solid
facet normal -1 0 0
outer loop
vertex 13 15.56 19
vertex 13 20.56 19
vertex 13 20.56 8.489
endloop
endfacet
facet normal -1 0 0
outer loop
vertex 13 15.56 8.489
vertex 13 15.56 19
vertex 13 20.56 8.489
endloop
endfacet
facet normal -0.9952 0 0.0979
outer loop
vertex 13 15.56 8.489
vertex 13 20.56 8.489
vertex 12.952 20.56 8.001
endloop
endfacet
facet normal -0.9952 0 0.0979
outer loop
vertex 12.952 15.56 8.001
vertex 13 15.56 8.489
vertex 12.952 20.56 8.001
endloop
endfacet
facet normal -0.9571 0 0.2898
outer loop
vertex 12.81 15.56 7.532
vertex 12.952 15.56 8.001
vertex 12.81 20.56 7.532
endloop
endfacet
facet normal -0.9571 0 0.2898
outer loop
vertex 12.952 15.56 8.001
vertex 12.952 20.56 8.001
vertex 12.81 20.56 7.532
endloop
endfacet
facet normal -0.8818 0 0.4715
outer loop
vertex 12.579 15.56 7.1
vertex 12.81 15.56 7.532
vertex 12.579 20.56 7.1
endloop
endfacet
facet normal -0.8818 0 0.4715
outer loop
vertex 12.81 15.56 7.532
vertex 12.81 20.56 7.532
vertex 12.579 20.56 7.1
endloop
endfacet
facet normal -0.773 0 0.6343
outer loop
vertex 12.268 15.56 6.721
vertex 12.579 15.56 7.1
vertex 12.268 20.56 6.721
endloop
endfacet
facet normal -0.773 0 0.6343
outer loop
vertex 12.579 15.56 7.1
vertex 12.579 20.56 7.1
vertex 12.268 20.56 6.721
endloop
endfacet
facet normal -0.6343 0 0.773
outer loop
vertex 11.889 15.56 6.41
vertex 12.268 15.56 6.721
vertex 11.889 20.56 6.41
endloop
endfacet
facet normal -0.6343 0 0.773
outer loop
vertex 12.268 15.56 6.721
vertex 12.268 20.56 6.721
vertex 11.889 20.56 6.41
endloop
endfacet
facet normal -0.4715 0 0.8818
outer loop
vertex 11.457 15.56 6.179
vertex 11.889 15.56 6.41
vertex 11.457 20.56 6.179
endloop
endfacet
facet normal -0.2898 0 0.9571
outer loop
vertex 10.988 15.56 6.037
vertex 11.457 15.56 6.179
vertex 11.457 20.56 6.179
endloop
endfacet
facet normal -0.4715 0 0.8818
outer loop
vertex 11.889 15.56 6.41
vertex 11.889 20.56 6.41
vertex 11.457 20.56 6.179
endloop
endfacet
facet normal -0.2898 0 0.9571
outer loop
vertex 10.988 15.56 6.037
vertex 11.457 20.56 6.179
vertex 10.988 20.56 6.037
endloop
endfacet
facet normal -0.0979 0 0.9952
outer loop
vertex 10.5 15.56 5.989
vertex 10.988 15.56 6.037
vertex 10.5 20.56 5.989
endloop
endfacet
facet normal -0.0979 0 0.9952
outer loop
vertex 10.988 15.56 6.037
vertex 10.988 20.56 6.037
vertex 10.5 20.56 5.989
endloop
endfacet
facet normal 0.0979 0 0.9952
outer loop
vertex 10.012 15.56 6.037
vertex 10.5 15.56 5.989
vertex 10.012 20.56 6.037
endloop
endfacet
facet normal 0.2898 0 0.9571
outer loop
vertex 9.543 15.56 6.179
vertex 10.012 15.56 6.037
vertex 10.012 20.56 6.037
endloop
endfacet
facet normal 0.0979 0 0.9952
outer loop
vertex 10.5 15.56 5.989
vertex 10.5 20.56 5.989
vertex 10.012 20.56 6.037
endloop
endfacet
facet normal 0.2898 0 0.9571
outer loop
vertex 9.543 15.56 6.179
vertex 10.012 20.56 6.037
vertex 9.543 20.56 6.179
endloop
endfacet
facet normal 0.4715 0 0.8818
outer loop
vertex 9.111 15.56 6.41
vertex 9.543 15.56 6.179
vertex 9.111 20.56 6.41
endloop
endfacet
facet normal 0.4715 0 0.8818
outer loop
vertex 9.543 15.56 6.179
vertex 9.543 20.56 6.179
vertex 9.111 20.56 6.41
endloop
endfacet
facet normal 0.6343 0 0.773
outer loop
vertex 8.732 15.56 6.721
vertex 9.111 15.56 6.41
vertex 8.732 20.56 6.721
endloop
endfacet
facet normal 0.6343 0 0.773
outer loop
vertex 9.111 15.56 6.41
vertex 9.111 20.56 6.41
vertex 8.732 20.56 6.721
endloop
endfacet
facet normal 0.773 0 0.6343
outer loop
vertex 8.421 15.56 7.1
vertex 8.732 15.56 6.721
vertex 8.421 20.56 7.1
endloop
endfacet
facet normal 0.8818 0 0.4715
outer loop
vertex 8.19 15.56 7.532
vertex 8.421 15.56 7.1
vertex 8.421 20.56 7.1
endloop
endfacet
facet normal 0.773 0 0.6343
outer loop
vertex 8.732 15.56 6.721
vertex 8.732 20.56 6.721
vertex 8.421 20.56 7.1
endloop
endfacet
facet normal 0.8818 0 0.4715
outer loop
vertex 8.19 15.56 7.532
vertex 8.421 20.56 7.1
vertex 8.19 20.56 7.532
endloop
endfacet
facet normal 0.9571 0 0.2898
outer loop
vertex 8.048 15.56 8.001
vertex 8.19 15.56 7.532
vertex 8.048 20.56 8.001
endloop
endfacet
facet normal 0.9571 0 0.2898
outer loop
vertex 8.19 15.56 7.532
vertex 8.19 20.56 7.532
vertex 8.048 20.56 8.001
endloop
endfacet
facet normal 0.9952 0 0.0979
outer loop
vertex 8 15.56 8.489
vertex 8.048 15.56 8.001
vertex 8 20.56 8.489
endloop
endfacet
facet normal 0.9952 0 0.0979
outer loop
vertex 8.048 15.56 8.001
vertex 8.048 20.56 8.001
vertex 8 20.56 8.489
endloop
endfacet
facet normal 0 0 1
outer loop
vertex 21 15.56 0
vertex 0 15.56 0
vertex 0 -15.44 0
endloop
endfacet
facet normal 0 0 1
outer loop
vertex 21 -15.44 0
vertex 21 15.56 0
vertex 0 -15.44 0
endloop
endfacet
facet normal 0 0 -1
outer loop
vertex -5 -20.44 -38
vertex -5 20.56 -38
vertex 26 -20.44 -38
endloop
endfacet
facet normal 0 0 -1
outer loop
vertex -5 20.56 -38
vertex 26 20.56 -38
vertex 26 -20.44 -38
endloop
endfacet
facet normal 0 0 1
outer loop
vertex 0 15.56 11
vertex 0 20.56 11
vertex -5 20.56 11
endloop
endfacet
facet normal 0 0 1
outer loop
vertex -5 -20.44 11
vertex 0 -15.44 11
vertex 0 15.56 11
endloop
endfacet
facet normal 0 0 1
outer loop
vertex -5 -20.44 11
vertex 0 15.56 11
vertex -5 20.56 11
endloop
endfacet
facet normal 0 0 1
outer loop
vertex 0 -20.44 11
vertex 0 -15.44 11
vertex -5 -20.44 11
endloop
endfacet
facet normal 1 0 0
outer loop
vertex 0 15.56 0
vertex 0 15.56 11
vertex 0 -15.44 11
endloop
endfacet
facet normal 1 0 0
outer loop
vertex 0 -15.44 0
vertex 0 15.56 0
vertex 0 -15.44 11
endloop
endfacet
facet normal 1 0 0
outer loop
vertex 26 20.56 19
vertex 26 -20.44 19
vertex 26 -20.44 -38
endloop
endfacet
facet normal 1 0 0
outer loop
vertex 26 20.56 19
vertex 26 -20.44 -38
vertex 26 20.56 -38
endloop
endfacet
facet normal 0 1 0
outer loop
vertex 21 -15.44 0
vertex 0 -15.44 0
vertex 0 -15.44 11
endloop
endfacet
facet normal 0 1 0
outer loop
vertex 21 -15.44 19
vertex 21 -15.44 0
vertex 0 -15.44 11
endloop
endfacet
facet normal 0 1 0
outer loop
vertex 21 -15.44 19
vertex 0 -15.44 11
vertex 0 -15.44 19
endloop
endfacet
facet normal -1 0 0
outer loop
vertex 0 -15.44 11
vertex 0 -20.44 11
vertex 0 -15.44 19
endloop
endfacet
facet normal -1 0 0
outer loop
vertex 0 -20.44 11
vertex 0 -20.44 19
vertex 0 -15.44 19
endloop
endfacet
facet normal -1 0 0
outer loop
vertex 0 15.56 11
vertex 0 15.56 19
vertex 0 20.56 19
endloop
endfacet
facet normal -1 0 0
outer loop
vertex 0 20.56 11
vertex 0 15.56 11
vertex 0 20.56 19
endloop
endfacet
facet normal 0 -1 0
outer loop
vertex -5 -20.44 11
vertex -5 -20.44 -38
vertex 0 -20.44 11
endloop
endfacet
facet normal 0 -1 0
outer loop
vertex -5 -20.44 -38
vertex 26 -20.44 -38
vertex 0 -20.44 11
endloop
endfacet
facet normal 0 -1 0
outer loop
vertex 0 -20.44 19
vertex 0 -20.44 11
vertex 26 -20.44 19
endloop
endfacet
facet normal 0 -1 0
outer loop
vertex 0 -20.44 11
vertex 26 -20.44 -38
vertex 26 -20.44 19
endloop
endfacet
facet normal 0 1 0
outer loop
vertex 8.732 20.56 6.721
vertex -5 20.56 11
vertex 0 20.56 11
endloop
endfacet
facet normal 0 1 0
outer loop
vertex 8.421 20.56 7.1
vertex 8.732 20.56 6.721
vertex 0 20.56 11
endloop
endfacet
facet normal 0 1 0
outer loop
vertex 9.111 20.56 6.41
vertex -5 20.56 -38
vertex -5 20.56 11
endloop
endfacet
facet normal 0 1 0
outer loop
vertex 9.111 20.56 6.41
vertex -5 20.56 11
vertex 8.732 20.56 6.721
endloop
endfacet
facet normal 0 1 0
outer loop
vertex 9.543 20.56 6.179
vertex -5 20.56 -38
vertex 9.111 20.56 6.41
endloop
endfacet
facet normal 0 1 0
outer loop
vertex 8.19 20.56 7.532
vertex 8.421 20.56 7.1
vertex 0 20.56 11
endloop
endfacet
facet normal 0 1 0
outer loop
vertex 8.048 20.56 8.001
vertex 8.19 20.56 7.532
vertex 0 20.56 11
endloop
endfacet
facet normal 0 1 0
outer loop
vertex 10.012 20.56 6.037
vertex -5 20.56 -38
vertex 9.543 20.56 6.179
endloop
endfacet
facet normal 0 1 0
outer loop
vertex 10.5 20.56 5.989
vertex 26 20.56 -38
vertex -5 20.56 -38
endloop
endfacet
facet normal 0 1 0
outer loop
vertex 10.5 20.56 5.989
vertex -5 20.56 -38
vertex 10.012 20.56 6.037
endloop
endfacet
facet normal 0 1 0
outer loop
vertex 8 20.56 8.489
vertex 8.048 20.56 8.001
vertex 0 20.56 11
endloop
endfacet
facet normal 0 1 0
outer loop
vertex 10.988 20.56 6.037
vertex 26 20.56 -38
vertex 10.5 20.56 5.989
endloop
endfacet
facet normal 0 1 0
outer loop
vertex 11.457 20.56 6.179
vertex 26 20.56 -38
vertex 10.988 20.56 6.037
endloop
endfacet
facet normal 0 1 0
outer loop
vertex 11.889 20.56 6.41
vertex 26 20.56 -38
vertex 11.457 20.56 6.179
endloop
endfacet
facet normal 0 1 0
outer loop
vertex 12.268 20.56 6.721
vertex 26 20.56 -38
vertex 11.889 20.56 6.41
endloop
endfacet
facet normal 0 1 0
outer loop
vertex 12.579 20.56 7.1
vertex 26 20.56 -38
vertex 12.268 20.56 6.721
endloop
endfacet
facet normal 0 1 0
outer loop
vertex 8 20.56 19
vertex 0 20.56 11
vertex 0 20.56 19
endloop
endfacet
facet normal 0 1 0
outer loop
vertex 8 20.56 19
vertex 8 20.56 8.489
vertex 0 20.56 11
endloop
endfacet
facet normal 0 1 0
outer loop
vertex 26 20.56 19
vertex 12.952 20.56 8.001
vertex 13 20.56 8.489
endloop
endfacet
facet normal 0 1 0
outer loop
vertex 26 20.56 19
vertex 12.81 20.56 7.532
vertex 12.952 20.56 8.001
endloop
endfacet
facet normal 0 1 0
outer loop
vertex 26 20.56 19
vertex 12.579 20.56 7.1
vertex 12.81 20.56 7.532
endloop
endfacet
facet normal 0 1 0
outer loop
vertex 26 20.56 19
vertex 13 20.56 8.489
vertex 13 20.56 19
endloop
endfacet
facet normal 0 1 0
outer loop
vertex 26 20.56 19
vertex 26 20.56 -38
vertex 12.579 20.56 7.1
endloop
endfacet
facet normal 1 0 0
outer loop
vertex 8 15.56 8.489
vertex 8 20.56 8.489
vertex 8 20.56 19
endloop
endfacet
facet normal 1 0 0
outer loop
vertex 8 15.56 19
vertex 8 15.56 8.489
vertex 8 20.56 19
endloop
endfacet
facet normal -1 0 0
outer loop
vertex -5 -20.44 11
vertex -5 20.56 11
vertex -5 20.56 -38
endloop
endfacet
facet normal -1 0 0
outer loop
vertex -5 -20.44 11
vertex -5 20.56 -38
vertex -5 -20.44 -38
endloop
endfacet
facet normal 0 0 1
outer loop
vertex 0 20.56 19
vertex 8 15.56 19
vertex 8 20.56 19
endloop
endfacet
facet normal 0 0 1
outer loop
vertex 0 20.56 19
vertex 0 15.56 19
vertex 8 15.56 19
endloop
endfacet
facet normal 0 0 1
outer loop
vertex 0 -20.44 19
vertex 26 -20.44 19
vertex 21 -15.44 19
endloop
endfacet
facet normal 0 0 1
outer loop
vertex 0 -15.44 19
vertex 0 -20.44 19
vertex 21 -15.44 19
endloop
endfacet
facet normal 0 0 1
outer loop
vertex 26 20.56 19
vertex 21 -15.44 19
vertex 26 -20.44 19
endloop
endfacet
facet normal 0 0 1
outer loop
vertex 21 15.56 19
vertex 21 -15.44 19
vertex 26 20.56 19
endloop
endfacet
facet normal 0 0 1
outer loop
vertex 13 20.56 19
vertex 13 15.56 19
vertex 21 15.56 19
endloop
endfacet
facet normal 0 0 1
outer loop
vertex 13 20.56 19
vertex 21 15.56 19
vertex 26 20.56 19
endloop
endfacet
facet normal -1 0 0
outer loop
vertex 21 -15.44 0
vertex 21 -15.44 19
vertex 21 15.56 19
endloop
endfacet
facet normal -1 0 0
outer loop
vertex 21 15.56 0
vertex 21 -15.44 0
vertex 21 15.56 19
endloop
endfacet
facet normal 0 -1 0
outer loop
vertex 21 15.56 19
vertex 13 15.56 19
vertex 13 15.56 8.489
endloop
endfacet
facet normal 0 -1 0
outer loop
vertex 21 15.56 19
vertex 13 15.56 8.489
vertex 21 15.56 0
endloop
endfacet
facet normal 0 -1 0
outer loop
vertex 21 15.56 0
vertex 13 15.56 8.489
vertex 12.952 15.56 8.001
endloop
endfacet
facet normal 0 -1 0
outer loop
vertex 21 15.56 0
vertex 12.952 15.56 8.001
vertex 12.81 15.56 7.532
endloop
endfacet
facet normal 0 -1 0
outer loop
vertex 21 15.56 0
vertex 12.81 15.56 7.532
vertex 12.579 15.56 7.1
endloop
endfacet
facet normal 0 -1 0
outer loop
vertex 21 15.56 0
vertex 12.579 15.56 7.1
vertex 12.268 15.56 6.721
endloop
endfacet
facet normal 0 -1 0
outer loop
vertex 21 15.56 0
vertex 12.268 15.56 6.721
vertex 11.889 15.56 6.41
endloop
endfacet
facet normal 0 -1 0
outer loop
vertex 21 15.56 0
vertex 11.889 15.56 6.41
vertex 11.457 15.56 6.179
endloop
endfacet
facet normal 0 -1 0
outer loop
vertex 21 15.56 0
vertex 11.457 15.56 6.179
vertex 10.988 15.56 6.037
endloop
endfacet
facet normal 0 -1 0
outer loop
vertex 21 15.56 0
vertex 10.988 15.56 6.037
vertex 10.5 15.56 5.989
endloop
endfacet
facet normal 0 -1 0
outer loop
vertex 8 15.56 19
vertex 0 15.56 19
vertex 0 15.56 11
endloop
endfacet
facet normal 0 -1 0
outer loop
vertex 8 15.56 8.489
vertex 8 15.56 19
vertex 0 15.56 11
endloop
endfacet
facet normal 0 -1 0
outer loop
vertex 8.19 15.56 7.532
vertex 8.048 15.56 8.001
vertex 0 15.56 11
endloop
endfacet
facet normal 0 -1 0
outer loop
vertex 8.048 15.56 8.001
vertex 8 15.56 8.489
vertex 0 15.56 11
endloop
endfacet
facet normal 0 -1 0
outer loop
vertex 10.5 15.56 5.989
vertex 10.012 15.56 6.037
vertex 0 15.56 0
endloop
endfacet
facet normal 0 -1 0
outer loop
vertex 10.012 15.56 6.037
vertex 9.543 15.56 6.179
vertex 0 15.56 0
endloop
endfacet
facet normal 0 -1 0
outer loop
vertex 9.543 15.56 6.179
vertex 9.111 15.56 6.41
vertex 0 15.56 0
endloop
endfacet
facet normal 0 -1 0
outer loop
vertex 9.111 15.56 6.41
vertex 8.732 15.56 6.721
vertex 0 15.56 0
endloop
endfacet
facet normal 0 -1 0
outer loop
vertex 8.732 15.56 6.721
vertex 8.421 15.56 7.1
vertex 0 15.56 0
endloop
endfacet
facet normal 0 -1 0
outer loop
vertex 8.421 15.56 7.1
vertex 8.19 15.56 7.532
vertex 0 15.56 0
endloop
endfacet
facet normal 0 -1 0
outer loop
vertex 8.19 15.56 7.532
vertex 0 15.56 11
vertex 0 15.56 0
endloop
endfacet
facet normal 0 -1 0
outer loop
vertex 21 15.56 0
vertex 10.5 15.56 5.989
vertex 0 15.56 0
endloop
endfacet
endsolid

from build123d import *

# Parameters (mm, degrees)
F1_DEPTH = 21
F2_W     = 41
F2_H     = 57
F3_DEPTH = 5
F4_W     = 41
F4_H     = 49
F5_DEPTH = 5
F7_DEPTH = 5


with BuildPart() as f1:
    # F0 (on Right) → F1 (new body)
    with BuildSketch(Plane.YZ):
        Polygon((15.559513, 19), (15.559513, 0), (-15.440487, 0), (-15.440487, 19), (-20.440487, 19), (-20.440487, 0), (-20.440487, -38), (-15.440487, -38), (15.469343, -38), (20.559513, -38), (20.559513, 0), (20.559513, 19), align=None)
    extrude(amount=F1_DEPTH)

    # F2 (on face) → F3 (join)
    with BuildSketch(Plane.YZ.offset(21)):
        with Locations((0.059513, -9.5)):
            Rectangle(F2_W, F2_H)
    extrude(amount=F3_DEPTH)

    # F4 (on face) → F5 (join)
    with BuildSketch(Plane(origin=(0, 0, 0), x_dir=(0, -1, 0), z_dir=(-1, 0, 0))):
        with Locations((-0.059513, -13.5)):
            Rectangle(F4_W, F4_H)
    extrude(amount=F5_DEPTH)

    # F6 (on face) → F7 (cut)
    with BuildSketch(Plane(origin=(0, 20.559513, 0), x_dir=(-1, 0, 0), z_dir=(0, 1, 0))):
        with BuildLine():
            Line((-8, 8.489112), (-8, 19))
            Line((-8, 19), (-13, 19))
            Line((-13, 19), (-13, 8.489112))
            ThreePointArc((-13, 8.489112), (-10.5, 5.989112), (-8, 8.489112))
        make_face()
    extrude(amount=-F7_DEPTH, mode=Mode.SUBTRACT)


solid = f1.part
